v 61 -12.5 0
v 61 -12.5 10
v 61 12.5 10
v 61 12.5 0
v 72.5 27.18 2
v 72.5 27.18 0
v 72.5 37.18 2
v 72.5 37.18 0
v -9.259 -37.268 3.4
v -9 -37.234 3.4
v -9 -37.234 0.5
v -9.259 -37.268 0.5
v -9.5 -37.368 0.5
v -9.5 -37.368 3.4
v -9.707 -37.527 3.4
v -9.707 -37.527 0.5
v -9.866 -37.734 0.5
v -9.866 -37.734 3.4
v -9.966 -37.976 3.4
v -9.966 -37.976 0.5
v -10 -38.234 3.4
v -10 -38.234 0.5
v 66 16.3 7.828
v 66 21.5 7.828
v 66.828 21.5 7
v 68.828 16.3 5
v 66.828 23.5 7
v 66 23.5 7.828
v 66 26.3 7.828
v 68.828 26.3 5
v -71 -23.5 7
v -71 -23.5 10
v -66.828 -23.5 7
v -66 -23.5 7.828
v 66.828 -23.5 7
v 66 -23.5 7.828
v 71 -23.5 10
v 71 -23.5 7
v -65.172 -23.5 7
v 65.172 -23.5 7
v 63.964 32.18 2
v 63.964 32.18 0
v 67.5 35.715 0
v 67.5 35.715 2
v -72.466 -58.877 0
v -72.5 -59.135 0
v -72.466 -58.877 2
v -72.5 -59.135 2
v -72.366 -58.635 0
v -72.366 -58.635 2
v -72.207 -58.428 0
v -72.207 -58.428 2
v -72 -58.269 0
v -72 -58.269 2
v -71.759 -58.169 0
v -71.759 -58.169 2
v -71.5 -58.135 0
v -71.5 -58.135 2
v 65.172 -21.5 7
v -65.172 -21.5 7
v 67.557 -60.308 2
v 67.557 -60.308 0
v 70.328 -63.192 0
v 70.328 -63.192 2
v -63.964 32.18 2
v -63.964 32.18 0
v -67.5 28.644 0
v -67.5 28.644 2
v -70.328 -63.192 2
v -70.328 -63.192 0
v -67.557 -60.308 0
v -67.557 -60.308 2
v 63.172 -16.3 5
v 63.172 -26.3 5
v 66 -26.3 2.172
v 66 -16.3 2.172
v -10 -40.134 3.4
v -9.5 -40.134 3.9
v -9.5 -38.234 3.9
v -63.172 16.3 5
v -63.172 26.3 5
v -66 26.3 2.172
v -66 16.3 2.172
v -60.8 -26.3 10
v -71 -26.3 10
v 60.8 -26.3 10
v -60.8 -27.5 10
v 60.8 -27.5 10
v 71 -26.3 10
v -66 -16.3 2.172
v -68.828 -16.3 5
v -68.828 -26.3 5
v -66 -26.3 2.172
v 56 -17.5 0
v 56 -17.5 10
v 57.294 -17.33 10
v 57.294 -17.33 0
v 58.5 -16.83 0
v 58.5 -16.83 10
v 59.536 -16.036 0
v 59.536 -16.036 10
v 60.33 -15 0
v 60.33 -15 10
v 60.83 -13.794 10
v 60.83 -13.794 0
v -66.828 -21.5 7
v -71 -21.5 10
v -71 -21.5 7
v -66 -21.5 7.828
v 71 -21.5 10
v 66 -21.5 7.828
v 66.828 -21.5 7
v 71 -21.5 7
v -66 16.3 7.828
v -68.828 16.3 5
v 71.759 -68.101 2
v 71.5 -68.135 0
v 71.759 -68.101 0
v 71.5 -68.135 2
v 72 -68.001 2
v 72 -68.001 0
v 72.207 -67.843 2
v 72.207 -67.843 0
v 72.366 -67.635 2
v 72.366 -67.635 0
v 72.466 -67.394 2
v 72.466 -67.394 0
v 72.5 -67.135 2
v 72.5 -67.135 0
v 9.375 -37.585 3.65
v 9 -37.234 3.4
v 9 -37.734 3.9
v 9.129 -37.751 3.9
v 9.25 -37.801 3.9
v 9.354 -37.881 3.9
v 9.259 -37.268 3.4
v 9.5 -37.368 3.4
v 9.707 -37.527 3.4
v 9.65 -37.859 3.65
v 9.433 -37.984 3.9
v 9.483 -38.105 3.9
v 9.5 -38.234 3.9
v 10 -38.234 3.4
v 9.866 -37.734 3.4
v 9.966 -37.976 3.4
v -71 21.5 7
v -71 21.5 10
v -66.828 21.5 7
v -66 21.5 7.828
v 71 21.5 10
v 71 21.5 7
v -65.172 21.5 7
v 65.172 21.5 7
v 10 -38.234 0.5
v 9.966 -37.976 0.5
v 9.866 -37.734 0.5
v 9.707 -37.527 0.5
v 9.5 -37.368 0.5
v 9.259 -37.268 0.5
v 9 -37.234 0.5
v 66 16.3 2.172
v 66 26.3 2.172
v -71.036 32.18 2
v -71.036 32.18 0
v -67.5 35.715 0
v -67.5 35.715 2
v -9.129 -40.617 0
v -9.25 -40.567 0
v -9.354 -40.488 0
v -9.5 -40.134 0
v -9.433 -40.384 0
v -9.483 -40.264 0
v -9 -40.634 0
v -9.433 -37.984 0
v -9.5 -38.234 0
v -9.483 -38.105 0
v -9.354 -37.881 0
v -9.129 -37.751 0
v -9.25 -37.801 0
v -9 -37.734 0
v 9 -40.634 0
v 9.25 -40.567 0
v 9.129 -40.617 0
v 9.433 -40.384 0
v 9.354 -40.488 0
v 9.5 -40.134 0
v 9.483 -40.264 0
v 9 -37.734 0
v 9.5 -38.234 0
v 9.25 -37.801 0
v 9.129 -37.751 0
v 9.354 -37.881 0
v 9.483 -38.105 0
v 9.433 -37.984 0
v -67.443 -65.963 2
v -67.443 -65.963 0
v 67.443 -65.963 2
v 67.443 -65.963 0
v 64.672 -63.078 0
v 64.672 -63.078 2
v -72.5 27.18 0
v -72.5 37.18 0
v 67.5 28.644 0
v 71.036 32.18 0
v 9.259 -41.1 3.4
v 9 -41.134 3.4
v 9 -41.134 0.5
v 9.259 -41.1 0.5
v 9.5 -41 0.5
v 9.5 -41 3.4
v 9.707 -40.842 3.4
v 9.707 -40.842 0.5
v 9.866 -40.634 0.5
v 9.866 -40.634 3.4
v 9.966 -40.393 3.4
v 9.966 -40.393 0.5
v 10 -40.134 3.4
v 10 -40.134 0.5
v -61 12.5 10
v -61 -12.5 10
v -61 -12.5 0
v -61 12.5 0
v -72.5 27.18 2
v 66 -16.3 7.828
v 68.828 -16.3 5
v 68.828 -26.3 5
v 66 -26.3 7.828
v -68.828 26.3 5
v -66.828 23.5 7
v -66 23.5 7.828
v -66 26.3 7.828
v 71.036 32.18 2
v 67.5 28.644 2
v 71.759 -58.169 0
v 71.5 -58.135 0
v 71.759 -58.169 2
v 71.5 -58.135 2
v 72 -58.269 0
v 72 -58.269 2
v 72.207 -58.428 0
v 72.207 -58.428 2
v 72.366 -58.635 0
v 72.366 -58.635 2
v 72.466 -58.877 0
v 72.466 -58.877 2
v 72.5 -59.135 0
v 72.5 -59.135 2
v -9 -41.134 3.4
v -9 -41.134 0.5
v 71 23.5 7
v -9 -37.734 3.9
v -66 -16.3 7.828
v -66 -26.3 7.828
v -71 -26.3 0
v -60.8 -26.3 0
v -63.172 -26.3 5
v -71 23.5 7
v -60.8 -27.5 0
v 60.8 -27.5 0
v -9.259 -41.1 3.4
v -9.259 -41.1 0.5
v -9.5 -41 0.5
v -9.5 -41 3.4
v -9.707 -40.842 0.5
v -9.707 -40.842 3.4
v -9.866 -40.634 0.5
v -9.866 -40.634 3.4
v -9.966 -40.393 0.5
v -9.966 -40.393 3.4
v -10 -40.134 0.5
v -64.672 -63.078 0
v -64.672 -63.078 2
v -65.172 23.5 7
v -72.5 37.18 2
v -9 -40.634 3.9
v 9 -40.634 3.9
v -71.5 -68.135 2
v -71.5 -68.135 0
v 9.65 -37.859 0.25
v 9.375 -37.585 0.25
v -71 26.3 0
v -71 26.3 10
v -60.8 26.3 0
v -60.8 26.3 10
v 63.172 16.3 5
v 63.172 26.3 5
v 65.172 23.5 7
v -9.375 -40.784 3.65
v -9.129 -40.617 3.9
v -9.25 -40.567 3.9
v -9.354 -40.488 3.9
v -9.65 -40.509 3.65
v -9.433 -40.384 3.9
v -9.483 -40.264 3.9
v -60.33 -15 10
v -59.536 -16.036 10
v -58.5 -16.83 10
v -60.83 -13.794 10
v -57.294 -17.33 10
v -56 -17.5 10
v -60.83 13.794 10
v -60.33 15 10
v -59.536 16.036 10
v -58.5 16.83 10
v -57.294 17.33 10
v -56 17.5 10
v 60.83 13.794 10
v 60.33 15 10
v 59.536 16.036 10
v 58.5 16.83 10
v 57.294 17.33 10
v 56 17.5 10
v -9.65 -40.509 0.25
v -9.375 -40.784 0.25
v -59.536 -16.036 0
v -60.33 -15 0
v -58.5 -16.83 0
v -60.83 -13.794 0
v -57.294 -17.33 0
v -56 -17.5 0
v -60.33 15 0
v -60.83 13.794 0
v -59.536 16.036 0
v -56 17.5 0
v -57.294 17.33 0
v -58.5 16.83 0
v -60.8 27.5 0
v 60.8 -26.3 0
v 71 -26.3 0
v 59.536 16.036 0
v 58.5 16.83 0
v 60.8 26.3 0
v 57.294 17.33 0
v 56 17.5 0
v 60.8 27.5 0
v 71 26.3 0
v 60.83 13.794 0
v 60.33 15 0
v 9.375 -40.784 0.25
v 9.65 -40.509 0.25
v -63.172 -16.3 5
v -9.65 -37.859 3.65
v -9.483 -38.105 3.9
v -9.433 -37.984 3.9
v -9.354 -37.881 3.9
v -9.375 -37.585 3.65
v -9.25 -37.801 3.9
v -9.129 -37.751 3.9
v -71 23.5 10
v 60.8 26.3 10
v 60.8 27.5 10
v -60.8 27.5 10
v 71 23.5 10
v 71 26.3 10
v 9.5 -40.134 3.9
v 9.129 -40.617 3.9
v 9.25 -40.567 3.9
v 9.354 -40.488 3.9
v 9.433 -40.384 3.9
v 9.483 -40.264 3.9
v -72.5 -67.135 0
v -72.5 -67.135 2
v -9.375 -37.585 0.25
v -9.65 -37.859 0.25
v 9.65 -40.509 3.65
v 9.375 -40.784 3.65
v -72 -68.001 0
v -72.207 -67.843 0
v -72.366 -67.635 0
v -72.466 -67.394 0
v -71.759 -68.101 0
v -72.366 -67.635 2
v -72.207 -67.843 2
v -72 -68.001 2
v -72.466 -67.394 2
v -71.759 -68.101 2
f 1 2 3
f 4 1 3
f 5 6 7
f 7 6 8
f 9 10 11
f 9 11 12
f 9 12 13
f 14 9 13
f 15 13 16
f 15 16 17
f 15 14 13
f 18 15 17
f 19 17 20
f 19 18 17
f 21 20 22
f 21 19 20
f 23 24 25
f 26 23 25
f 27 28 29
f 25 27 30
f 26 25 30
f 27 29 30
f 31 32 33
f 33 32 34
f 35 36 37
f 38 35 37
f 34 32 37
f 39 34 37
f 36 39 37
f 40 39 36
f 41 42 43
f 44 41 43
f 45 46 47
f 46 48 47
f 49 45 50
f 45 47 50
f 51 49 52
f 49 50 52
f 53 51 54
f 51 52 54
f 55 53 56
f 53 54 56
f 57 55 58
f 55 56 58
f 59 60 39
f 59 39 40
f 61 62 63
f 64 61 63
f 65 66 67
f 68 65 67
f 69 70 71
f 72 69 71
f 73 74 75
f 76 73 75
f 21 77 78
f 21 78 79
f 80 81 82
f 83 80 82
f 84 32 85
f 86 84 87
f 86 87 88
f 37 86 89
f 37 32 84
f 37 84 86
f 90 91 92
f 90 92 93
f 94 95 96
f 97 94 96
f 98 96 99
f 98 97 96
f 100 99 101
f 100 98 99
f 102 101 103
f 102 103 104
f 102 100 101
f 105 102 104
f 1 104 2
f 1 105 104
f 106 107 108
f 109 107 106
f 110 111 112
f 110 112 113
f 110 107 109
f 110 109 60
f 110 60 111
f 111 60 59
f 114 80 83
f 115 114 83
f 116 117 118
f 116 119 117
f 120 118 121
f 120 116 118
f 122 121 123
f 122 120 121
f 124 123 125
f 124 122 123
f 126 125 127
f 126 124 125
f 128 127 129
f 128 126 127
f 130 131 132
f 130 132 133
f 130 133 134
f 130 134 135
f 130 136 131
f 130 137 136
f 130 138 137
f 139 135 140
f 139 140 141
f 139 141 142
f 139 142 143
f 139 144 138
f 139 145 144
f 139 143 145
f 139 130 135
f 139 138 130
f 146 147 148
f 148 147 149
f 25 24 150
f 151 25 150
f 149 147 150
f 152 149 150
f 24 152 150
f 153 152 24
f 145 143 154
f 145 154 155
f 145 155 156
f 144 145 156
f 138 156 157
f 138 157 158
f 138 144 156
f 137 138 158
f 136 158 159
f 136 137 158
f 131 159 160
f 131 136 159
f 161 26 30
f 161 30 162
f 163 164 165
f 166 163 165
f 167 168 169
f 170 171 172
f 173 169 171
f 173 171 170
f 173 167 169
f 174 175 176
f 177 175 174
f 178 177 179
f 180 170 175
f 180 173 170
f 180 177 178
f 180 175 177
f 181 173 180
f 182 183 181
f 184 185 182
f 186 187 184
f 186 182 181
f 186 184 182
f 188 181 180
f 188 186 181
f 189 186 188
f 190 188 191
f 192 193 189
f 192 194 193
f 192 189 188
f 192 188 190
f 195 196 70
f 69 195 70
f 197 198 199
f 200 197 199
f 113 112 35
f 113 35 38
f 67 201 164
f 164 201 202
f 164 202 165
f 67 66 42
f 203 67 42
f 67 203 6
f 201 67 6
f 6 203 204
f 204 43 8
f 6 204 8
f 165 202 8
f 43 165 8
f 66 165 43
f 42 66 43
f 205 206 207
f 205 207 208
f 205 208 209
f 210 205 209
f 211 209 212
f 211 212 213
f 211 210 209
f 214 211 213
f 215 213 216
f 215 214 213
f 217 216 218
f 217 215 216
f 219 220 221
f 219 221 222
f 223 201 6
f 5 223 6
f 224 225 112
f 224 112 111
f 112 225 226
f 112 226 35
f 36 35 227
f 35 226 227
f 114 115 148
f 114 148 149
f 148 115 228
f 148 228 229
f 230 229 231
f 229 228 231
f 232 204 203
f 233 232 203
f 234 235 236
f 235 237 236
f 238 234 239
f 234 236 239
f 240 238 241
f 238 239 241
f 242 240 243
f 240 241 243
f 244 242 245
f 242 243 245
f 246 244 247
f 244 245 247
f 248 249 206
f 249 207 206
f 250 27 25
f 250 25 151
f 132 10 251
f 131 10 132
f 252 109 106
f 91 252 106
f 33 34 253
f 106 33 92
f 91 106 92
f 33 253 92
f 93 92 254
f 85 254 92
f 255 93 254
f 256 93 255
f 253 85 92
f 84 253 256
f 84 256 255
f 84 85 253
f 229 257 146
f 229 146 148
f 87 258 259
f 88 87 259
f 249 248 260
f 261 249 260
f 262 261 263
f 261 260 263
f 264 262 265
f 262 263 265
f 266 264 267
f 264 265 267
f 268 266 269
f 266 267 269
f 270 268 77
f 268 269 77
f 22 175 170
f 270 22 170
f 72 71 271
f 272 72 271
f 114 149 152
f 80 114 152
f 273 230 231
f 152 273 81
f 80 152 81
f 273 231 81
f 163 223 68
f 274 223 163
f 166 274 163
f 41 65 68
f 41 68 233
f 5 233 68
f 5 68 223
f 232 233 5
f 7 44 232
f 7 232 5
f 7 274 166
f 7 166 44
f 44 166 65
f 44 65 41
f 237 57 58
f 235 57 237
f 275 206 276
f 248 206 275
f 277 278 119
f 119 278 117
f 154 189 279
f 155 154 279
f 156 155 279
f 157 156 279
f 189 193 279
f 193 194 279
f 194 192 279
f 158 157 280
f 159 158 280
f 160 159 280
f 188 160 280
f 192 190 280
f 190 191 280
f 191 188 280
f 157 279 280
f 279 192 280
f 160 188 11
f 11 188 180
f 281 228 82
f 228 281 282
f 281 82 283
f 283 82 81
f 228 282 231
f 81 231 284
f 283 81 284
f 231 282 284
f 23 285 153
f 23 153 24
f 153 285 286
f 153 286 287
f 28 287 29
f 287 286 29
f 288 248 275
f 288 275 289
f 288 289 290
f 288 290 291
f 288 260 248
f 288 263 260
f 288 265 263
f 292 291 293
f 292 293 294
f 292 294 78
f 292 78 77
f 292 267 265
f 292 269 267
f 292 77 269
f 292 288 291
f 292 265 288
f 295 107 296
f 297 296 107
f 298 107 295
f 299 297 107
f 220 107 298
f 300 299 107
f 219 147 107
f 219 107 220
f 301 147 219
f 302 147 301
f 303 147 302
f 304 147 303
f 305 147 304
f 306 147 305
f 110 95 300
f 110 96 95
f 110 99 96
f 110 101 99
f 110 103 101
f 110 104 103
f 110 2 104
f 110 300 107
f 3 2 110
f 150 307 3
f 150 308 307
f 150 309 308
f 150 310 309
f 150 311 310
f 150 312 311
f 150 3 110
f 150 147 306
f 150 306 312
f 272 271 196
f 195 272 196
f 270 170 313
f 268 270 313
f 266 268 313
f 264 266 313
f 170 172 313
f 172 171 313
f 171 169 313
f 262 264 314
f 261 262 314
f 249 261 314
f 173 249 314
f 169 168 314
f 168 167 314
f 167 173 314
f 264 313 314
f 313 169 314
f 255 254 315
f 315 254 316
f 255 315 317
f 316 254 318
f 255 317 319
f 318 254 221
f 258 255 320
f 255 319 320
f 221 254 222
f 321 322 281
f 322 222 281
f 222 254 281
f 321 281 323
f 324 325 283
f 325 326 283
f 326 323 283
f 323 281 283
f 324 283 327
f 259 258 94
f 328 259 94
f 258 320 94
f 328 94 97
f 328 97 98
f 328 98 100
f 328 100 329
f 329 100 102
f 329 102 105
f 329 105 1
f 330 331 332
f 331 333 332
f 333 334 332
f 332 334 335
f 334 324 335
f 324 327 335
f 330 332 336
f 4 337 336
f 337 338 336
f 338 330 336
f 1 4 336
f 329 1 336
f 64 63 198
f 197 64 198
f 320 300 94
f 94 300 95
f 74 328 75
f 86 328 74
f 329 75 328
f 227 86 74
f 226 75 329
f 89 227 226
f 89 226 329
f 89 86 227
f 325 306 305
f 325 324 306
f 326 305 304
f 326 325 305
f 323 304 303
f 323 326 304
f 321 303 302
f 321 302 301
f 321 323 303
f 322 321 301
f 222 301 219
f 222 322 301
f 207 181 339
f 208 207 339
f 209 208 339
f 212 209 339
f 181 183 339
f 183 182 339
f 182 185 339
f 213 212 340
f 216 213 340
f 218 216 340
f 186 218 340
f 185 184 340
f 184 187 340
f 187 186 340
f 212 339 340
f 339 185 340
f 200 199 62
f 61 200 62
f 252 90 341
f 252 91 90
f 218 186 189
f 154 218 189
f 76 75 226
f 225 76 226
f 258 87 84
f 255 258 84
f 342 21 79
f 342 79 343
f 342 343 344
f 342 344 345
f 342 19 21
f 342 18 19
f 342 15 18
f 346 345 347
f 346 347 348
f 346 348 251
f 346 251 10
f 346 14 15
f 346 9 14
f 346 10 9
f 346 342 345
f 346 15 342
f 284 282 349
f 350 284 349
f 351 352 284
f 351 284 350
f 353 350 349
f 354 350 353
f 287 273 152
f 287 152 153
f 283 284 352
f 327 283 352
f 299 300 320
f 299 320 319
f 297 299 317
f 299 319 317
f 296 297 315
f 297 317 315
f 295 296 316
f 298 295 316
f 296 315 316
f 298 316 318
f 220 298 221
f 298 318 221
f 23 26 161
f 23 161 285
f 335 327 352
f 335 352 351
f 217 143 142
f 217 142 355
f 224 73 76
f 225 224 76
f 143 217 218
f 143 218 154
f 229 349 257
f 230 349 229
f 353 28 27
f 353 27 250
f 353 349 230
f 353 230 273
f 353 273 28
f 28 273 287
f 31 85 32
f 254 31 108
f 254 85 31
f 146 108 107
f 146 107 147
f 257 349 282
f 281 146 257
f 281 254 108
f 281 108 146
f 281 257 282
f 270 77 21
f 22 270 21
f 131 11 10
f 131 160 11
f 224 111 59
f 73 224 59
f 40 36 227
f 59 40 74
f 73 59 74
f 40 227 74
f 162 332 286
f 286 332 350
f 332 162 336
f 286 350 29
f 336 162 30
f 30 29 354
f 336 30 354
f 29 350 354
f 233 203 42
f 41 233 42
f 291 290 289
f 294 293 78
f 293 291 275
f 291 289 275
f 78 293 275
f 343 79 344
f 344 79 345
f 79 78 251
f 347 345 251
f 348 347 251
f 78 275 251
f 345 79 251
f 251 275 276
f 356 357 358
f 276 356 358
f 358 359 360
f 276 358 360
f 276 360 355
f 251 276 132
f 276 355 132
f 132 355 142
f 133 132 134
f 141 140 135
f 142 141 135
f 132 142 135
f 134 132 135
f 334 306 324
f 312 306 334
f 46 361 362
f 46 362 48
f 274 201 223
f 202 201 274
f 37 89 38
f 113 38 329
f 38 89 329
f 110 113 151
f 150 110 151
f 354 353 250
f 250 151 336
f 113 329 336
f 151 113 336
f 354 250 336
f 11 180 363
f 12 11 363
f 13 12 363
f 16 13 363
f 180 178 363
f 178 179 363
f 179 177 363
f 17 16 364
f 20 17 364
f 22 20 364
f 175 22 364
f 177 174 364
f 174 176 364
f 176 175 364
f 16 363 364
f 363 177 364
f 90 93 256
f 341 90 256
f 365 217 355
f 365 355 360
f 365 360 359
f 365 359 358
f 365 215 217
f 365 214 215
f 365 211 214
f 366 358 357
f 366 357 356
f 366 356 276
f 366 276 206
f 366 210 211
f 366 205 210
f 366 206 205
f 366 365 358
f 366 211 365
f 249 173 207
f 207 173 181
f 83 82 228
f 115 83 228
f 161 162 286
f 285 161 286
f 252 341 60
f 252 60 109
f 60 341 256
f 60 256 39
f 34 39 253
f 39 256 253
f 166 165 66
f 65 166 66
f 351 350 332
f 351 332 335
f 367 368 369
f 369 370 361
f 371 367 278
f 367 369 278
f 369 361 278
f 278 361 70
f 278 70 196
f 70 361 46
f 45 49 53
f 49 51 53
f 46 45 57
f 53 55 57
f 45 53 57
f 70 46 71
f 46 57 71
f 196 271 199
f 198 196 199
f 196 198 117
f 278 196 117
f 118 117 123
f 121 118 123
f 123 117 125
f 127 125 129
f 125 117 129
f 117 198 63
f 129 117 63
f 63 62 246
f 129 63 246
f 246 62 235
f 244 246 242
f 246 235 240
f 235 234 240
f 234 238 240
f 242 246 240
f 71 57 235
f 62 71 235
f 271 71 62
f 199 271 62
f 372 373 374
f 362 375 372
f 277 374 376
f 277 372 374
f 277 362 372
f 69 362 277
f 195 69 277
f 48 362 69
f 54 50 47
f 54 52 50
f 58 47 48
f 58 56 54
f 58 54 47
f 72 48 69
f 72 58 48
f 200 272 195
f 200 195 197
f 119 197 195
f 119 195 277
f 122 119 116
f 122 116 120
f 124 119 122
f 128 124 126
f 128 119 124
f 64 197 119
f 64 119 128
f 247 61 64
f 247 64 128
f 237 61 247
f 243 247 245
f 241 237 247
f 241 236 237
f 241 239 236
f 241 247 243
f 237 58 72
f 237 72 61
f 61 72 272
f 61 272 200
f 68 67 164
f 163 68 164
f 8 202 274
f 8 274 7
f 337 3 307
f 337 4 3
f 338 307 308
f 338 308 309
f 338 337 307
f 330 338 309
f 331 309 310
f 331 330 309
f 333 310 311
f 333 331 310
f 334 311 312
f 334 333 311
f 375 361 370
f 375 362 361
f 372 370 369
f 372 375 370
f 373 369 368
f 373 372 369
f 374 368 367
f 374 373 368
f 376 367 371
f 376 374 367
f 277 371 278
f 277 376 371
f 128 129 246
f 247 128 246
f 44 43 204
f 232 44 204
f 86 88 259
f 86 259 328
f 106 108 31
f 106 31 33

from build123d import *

# Parameters (mm, degrees)
F0_W      = 142
F0_H      = 55
F1_DEPTH  = 10
F2_W      = 142
F2_H      = 2
F3_DEPTH  = 3
F4_W      = 122
F4_H      = 35
F4_W_2    = 10.2
F4_H_2    = 1.2
F5_DEPTH  = 10.001
F7_DEPTH  = 10
F8_R      = 5
F9_W      = 3.9
F9_H      = 3.9
F10_DEPTH = 10
F11_R     = 1
F12_SIZE  = 0.5
F13_W     = 145
F13_H     = 10
F14_DEPTH = 2
F16_DEPTH = 10
F17_W     = 145
F17_H     = 10
F18_DEPTH = 2
F19_R     = 1


with BuildPart() as f1:
    # F0 (on Top) → F1 (new body)
    with BuildSketch(Plane.XY):
        Rectangle(F0_W, F0_H)
    extrude(amount=F1_DEPTH)

    # F2 (on face) → F3 (cut)
    with BuildSketch(Plane.XY.offset(10)):
        with Locations((0, 22.5)):
            Rectangle(F2_W, F2_H)
        with Locations((0, -22.5)):
            Rectangle(F2_W, F2_H)
    extrude(amount=-F3_DEPTH, mode=Mode.SUBTRACT)

    # F4 (on face) → F5 (cut, through all)
    with BuildSketch(Plane.XY.offset(10)):
        Rectangle(F4_W, F4_H)
        with Locations((-65.9, -26.9)):
            Rectangle(F4_W_2, F4_H_2)
        with Locations((-65.9, 26.9)):
            Rectangle(F4_W_2, F4_H_2)
        with Locations((65.9, 26.9)):
            Rectangle(F4_W_2, F4_H_2)
        with Locations((65.9, -26.9)):
            Rectangle(F4_W_2, F4_H_2)
    extrude(amount=-F5_DEPTH, mode=Mode.SUBTRACT)

    # F6 (on face) → F7 (cut)
    with BuildSketch(Plane.XZ.offset(26.3)):
        Polygon((-66, 2.171573), (-63.171573, 5), (-66, 7.828427), (-68.828427, 5), align=None)
        Polygon((66, 7.828427), (63.171573, 5), (66, 2.171573), (68.828427, 5), align=None)
    extrude(amount=-F7_DEPTH, mode=Mode.SUBTRACT)

    # F8
    f8_edges = [f1.edges().sort_by_distance(p)[0] for p in [
        (-61, -17.5, 5),
        (-61, 17.5, 5),
        (61, 17.5, 5),
        (61, -17.5, 5),
    ]]
    fillet(f8_edges, radius=F8_R)

    # F15 (on face) → F16 (cut)
    with BuildSketch(Plane(origin=(0, 26.3, 0), x_dir=(-1, 0, 0), z_dir=(0, 1, 0))):
        Polygon((68.828427, 5), (66, 7.828427), (63.171573, 5), (66, 2.171573), align=None)
        Polygon((-66, 7.828427), (-68.828427, 5), (-66, 2.171573), (-63.171573, 5), align=None)
    extrude(amount=-F16_DEPTH, mode=Mode.SUBTRACT)


with BuildPart() as f10:
    # F9 (on Right) → F10 (new body, symmetric)
    with BuildSketch(Plane.YZ):
        with Locations((-39.184413, 1.95)):
            Rectangle(F9_W, F9_H)
    extrude(amount=F10_DEPTH, both=True)

    # F11
    f11_edges = [f10.edges().sort_by_distance(p)[0] for p in [
        (10, -41.134413, 1.95),
        (10, -37.234413, 1.95),
        (-10, -41.134413, 1.95),
        (-10, -37.234413, 1.95),
    ]]
    fillet(f11_edges, radius=F11_R)

    # F12
    f12_edges = [f10.edges().sort_by_distance(p)[0] for p in [
        (-10, -39.184413, 3.9),
        (-9.707107, -37.527306, 3.9),
        (-9.707107, -40.841519, 3.9),
        (0, -37.234413, 3.9),
        (0, -41.134413, 3.9),
        (9.707107, -37.527306, 3.9),
        (9.707107, -40.841519, 3.9),
        (10, -39.184413, 3.9),
        (0, -41.134413, 0),
        (-9.707107, -40.841519, 0),
        (9.707107, -40.841519, 0),
        (-10, -39.184413, 0),
        (10, -39.184413, 0),
        (-9.707107, -37.527306, 0),
        (9.707107, -37.527306, 0),
        (0, -37.234413, 0),
    ]]
    chamfer(f12_edges, length=F12_SIZE)


with BuildPart() as f14:
    # F13 (on Top) → F14 (new body)
    with BuildSketch(Plane.XY):
        with Locations((0, 32.179889)):
            Rectangle(F13_W, F13_H)
        Polygon((-67.5, 35.715423), (-63.964466, 32.179889), (-67.5, 28.644355), (-71.035534, 32.179889), align=None, mode=Mode.SUBTRACT)
        Polygon((63.964466, 32.179889), (67.5, 35.715423), (71.035534, 32.179889), (67.5, 28.644355), align=None, mode=Mode.SUBTRACT)
    extrude(amount=F14_DEPTH)


with BuildPart() as f18:
    # F17 (on Top) → F18 (new body)
    with BuildSketch(Plane.XY):
        with Locations((0, -63.135419)):
            Rectangle(F17_W, F17_H)
        Polygon((-67.557006, -60.307567), (-64.672147, -63.078413), (-67.442994, -65.963272), (-70.327853, -63.192425), align=None, mode=Mode.SUBTRACT)
        Polygon((64.672147, -63.078413), (67.557006, -60.307567), (70.327853, -63.192425), (67.442994, -65.963272), align=None, mode=Mode.SUBTRACT)
    extrude(amount=F18_DEPTH)

    # F19
    f19_edges = [f18.edges().sort_by_distance(p)[0] for p in [
        (-72.5, -68.135419, 1),
        (72.5, -68.135419, 1),
        (72.5, -58.135419, 1),
        (-72.5, -58.135419, 1),
    ]]
    fillet(f19_edges, radius=F19_R)


solid = Compound([f1.part, f10.part, f14.part, f18.part])
